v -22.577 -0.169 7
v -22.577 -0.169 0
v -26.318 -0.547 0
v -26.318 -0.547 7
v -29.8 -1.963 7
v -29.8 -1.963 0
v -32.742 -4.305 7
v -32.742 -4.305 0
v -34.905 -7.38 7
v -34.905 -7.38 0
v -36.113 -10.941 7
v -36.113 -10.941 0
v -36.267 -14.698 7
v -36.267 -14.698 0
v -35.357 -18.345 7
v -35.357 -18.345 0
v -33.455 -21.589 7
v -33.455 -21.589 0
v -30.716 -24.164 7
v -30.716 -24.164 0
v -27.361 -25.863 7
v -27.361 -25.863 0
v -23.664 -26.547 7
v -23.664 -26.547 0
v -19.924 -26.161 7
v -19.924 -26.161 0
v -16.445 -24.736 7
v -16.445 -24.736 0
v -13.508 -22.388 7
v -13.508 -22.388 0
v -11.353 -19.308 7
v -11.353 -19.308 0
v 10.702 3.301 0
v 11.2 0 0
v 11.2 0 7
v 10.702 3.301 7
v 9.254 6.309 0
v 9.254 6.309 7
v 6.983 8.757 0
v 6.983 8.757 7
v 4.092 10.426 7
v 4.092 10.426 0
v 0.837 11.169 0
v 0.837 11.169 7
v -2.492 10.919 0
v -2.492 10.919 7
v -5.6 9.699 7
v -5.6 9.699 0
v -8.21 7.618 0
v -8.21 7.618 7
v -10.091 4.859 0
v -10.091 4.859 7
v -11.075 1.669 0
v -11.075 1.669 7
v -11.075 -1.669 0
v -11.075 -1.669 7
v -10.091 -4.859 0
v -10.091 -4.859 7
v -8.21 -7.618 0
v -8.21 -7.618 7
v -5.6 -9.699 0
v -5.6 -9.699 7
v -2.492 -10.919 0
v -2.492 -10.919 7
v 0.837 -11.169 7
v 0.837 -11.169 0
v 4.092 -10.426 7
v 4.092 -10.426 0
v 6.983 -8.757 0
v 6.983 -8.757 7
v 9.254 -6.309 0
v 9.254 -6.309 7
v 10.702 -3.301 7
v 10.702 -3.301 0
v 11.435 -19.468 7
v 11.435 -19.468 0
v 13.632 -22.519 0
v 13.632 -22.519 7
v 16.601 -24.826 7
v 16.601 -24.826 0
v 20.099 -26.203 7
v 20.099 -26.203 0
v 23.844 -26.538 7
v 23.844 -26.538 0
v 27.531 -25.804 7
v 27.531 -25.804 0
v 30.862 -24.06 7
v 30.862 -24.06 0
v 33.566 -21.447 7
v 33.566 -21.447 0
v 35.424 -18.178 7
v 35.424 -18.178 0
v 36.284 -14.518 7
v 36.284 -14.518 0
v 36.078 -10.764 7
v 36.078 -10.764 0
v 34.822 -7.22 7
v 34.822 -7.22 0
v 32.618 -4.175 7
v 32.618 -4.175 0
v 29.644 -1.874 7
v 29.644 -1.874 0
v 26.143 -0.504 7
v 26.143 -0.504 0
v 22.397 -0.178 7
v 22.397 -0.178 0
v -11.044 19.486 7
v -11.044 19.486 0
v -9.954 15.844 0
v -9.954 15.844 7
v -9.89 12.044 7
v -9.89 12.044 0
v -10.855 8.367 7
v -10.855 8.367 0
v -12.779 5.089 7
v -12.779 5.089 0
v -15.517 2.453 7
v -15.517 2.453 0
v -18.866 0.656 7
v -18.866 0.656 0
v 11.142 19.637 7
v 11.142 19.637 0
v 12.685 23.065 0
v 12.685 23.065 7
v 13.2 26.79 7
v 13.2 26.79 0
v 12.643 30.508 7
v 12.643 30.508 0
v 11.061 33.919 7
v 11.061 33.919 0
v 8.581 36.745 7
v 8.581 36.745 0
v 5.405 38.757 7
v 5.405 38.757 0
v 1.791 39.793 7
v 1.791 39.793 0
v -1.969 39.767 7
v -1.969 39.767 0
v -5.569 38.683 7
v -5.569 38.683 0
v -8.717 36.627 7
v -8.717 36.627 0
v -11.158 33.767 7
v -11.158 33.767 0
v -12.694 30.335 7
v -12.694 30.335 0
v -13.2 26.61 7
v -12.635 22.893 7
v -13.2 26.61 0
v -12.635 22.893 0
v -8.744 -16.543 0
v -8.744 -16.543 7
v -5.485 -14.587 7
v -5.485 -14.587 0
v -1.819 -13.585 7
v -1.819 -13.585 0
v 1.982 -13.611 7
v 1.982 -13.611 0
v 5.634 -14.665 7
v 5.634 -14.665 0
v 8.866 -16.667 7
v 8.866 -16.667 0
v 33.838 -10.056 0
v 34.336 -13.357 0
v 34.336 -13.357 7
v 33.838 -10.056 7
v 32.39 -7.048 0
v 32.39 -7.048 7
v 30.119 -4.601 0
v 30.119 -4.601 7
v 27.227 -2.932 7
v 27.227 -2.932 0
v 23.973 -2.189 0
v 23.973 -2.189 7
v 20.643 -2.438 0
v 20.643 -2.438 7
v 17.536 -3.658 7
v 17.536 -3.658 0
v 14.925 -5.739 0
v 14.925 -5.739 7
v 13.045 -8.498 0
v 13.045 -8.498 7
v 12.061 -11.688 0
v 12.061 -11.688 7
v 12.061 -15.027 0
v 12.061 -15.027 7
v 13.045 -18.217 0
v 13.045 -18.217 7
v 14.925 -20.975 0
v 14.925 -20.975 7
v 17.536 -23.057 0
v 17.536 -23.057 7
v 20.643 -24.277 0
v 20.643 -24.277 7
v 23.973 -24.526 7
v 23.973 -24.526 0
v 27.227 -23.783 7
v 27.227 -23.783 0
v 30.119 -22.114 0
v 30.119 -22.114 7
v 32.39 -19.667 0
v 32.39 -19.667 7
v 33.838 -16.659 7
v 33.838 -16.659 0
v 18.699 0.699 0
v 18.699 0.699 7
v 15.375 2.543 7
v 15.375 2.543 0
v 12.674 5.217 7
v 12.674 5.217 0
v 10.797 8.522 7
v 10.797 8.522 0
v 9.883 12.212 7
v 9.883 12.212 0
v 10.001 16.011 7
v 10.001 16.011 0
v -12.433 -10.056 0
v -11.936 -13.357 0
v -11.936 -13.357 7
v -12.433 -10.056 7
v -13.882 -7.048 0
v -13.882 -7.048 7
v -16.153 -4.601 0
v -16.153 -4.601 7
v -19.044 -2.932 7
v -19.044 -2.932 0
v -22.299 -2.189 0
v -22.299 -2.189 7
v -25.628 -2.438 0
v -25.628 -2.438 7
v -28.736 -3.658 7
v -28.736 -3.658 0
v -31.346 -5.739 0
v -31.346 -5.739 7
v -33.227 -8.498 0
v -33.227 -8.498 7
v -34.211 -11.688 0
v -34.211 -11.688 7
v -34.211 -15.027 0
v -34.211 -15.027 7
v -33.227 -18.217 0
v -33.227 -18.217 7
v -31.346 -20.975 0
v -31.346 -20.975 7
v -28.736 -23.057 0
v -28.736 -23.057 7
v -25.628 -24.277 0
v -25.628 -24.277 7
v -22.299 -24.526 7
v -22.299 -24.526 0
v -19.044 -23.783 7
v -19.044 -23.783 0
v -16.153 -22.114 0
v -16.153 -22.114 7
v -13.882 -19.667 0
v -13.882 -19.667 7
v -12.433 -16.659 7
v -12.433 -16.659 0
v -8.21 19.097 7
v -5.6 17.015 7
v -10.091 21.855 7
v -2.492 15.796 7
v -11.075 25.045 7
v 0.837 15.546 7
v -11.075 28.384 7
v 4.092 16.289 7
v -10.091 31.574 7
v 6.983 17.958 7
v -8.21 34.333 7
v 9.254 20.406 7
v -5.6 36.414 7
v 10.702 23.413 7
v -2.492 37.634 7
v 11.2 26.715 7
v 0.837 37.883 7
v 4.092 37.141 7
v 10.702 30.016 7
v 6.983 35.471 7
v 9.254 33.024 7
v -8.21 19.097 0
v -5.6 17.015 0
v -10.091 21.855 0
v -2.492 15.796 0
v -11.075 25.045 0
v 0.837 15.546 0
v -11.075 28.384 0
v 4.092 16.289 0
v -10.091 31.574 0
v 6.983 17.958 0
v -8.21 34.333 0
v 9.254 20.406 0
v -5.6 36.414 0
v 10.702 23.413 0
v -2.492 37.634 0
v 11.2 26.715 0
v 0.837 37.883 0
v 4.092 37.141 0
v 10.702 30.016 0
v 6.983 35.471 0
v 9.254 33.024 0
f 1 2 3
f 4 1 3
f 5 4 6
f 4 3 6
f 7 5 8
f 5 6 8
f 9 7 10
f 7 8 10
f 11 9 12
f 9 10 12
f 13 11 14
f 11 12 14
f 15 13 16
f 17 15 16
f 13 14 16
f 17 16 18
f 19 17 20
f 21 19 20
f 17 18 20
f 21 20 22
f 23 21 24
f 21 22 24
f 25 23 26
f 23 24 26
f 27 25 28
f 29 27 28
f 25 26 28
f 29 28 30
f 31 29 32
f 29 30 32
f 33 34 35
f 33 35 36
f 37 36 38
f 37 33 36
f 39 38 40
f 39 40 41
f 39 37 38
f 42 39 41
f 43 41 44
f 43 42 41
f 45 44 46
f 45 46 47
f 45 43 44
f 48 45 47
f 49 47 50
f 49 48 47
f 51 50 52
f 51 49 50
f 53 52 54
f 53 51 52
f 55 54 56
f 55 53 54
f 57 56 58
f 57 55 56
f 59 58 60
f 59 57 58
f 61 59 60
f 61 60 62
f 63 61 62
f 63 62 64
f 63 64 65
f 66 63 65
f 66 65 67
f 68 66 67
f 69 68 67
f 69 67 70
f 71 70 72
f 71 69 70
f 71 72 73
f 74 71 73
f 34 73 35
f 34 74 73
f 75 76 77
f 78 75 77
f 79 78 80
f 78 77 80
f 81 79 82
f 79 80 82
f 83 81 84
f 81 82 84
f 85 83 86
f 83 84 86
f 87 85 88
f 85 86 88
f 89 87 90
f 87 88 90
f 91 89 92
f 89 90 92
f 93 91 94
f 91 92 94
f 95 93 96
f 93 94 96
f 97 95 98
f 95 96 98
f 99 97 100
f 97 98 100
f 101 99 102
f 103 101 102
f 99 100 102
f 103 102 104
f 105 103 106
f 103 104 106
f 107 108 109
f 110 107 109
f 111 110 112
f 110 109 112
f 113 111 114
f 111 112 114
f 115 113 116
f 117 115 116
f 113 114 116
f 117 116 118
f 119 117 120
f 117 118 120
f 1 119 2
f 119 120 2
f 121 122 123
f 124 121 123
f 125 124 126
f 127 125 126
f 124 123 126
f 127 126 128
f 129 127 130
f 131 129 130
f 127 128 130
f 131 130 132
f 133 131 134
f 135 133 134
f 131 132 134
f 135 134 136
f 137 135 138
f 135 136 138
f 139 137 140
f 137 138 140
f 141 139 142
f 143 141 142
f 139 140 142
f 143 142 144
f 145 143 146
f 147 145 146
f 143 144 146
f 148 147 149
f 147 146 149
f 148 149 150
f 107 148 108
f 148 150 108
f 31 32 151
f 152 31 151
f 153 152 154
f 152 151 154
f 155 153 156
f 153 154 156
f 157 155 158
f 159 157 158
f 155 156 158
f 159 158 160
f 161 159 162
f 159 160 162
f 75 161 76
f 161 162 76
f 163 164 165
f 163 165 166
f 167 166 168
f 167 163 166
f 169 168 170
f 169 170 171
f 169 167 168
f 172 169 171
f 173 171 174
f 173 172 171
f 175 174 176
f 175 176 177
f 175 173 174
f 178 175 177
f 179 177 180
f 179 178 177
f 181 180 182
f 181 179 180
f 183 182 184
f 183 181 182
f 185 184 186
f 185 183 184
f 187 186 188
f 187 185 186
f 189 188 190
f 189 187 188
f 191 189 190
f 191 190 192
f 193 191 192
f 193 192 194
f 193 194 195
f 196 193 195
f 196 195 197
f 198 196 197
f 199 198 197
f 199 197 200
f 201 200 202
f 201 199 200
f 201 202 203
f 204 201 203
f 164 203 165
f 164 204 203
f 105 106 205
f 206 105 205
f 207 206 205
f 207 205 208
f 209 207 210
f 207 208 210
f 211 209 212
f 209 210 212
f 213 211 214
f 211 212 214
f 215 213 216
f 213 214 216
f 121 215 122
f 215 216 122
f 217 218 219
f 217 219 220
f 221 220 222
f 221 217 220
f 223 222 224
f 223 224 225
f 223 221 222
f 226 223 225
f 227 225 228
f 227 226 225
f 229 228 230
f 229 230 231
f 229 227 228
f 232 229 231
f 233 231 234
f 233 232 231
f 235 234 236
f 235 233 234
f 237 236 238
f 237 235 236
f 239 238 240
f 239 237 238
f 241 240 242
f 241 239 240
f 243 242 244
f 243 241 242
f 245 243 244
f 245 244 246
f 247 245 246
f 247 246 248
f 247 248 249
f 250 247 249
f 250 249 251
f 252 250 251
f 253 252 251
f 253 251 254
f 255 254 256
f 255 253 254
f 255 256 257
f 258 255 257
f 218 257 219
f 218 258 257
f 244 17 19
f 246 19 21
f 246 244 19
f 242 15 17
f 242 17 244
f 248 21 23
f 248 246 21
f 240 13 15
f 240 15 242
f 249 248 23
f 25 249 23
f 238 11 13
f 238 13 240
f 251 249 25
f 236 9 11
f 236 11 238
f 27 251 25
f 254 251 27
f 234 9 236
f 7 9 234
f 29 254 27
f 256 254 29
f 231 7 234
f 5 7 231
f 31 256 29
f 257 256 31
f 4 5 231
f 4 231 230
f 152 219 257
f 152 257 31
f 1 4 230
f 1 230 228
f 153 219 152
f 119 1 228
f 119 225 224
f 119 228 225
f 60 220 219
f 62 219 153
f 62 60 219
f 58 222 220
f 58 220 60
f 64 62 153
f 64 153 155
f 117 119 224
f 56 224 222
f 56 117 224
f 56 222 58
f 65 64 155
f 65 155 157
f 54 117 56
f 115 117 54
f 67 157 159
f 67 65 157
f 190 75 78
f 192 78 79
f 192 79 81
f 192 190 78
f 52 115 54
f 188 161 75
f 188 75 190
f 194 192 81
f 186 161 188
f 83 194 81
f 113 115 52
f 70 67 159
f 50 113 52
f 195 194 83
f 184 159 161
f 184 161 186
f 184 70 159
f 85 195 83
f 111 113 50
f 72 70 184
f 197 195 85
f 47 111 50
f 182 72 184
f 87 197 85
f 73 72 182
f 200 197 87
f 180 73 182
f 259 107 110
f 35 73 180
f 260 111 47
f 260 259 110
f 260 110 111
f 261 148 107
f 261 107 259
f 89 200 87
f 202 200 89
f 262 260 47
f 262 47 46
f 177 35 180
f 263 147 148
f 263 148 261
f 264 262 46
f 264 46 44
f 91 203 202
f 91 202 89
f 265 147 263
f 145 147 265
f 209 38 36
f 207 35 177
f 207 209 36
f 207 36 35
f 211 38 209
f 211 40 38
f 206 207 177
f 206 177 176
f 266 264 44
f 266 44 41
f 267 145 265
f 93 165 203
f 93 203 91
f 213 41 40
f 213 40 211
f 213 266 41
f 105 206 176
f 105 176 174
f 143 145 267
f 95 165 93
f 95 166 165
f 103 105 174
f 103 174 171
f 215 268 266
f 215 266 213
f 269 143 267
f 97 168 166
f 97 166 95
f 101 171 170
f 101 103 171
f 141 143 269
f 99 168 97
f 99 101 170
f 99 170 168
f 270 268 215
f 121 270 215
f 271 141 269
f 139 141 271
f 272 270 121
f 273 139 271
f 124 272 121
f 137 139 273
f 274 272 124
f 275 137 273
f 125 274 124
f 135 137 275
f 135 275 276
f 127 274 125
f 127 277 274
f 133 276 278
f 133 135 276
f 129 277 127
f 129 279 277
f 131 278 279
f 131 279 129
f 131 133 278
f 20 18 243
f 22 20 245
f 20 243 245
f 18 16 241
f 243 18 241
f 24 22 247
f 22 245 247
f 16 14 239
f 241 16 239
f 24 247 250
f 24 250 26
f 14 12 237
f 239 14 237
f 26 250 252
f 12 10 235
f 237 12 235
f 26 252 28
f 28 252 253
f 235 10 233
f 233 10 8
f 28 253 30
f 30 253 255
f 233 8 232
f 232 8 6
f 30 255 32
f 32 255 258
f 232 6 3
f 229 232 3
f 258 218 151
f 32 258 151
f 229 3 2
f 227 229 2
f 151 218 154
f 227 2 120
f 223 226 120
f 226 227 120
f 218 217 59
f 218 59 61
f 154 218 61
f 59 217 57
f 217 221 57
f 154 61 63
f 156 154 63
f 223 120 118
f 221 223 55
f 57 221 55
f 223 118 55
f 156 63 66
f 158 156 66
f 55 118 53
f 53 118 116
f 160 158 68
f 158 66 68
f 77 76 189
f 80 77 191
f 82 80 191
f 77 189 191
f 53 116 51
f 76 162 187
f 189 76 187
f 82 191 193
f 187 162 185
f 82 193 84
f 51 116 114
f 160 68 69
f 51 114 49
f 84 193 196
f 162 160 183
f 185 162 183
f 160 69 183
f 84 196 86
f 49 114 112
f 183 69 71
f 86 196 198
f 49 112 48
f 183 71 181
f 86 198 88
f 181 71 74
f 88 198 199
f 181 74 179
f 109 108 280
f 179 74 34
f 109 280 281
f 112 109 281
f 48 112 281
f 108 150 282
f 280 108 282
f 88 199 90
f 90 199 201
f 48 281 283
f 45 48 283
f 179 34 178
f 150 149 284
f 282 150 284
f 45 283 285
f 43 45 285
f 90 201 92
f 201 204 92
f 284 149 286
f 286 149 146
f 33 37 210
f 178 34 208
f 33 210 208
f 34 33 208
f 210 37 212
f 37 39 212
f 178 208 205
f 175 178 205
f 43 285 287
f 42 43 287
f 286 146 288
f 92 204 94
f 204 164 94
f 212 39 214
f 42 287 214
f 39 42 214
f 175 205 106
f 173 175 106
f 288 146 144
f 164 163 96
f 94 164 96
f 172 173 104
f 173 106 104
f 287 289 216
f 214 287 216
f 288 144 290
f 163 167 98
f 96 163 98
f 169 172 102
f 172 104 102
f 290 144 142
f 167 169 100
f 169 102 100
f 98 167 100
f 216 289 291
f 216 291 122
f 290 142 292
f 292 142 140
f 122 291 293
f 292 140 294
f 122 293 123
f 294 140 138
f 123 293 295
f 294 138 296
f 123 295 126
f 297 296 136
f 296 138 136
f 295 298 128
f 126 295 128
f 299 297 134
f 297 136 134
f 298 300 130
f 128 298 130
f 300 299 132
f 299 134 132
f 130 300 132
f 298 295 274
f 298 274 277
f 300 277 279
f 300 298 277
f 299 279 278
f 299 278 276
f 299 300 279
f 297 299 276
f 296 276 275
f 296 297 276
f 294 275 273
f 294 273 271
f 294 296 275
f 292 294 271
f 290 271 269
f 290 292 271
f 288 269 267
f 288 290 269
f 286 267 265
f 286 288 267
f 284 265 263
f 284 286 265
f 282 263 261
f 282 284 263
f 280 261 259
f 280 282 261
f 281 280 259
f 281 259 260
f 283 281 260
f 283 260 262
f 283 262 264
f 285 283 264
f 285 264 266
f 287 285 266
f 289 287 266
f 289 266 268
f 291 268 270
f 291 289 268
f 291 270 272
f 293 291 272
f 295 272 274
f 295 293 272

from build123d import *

# Parameters (mm, degrees)
F0_R     = 11.2
F1_DEPTH = 7
F2_R     = 1.5
F3_DEPTH = 7


# Not quite as in the source:
# - a feature names something its author has since deleted; it is built from what else it names


with BuildPart() as f1:
    # F0 (on Top) → F1 (new body)
    with BuildSketch(Plane.XY):
        with BuildLine():
            ThreePointArc((22.3972222345, -0.1780444605), (11.6219084102, 6.8053952105), (11.1419447663, 19.6368196267))
            ThreePointArc((11.1419447663, 19.6368196267), (-0.0899760733, 39.914441113), (-11.0444200915, 19.4855856595))
            ThreePointArc((-11.0444200915, 19.4855856595), (-11.7045993402, 6.6621703185), (-22.5769570295, -0.1692025982))
            ThreePointArc((-22.5769570295, -0.1692025982), (-34.5219319451, -20.0351421217), (-11.352802143, -19.3075411991))
            ThreePointArc((-11.352802143, -19.3075411991), (0.08269093, -13.467565529), (11.4350122631, -19.4676170286))
            ThreePointArc((11.4350122631, -19.4676170286), (34.6119080183, -19.8792989913), (22.3972222345, -0.1780444605))
        make_face()
        with Locations((-23.1356502259, -13.3573738858)):
            Circle(F0_R, mode=Mode.SUBTRACT)
        with Locations((23.1356502259, -13.3573738858)):
            Circle(F0_R, mode=Mode.SUBTRACT)
        Circle(F0_R, mode=Mode.SUBTRACT)
        with Locations((0, 26.7147477716)):
            Circle(F0_R, mode=Mode.SUBTRACT)
    extrude(amount=F1_DEPTH)

    # F2 (call 1 of 2: OpenCascade refuses the feature's edges together)
    f2_edges = [f1.edges().sort_by_distance(p)[0] for p in [
        (-34.521932, -20.035142, 7),
        (-11.704599, 6.66217, 7),
        (34.611908, -19.879299, 7),
        (-0.089976, 39.914441, 7),
        (0.082691, -13.467566, 7),
        (11.621908, 6.805395, 7),
    ]]
    fillet(f2_edges, radius=F2_R)

    # F2#2 (call 2 of 2)
    f2_2_edges = [f1.edges().sort_by_distance(p)[0] for p in [
        (34.611908, -19.879299, 0),
        (0.082691, -13.467566, 0),
        (-34.521932, -20.035142, 0),
        (-0.089976, 39.914441, 0),
        (11.621908, 6.805395, 0),
        (-11.704599, 6.66217, 0),
    ]]
    fillet(f2_2_edges, radius=F2_R)

    # F0 (on Top) → F3 (join)
    with BuildSketch(Plane.XY):
        with BuildLine():
            ThreePointArc((22.3972222345, -0.1780444605), (11.6219084102, 6.8053952105), (11.1419447663, 19.6368196267))
            ThreePointArc((11.1419447663, 19.6368196267), (-0.0899760733, 39.914441113), (-11.0444200915, 19.4855856595))
            ThreePointArc((-11.0444200915, 19.4855856595), (-11.7045993402, 6.6621703185), (-22.5769570295, -0.1692025982))
            ThreePointArc((-22.5769570295, -0.1692025982), (-34.5219319451, -20.0351421217), (-11.352802143, -19.3075411991))
            ThreePointArc((-11.352802143, -19.3075411991), (0.08269093, -13.467565529), (11.4350122631, -19.4676170286))
            ThreePointArc((11.4350122631, -19.4676170286), (34.6119080183, -19.8792989913), (22.3972222345, -0.1780444605))
        make_face()
        with Locations((-23.1356502259, -13.3573738858)):
            Circle(F0_R, mode=Mode.SUBTRACT)
        with Locations((23.1356502259, -13.3573738858)):
            Circle(F0_R, mode=Mode.SUBTRACT)
        Circle(F0_R, mode=Mode.SUBTRACT)
        with Locations((0, 26.7147477716)):
            Circle(F0_R, mode=Mode.SUBTRACT)
    extrude(amount=F3_DEPTH)


solid = f1.part
